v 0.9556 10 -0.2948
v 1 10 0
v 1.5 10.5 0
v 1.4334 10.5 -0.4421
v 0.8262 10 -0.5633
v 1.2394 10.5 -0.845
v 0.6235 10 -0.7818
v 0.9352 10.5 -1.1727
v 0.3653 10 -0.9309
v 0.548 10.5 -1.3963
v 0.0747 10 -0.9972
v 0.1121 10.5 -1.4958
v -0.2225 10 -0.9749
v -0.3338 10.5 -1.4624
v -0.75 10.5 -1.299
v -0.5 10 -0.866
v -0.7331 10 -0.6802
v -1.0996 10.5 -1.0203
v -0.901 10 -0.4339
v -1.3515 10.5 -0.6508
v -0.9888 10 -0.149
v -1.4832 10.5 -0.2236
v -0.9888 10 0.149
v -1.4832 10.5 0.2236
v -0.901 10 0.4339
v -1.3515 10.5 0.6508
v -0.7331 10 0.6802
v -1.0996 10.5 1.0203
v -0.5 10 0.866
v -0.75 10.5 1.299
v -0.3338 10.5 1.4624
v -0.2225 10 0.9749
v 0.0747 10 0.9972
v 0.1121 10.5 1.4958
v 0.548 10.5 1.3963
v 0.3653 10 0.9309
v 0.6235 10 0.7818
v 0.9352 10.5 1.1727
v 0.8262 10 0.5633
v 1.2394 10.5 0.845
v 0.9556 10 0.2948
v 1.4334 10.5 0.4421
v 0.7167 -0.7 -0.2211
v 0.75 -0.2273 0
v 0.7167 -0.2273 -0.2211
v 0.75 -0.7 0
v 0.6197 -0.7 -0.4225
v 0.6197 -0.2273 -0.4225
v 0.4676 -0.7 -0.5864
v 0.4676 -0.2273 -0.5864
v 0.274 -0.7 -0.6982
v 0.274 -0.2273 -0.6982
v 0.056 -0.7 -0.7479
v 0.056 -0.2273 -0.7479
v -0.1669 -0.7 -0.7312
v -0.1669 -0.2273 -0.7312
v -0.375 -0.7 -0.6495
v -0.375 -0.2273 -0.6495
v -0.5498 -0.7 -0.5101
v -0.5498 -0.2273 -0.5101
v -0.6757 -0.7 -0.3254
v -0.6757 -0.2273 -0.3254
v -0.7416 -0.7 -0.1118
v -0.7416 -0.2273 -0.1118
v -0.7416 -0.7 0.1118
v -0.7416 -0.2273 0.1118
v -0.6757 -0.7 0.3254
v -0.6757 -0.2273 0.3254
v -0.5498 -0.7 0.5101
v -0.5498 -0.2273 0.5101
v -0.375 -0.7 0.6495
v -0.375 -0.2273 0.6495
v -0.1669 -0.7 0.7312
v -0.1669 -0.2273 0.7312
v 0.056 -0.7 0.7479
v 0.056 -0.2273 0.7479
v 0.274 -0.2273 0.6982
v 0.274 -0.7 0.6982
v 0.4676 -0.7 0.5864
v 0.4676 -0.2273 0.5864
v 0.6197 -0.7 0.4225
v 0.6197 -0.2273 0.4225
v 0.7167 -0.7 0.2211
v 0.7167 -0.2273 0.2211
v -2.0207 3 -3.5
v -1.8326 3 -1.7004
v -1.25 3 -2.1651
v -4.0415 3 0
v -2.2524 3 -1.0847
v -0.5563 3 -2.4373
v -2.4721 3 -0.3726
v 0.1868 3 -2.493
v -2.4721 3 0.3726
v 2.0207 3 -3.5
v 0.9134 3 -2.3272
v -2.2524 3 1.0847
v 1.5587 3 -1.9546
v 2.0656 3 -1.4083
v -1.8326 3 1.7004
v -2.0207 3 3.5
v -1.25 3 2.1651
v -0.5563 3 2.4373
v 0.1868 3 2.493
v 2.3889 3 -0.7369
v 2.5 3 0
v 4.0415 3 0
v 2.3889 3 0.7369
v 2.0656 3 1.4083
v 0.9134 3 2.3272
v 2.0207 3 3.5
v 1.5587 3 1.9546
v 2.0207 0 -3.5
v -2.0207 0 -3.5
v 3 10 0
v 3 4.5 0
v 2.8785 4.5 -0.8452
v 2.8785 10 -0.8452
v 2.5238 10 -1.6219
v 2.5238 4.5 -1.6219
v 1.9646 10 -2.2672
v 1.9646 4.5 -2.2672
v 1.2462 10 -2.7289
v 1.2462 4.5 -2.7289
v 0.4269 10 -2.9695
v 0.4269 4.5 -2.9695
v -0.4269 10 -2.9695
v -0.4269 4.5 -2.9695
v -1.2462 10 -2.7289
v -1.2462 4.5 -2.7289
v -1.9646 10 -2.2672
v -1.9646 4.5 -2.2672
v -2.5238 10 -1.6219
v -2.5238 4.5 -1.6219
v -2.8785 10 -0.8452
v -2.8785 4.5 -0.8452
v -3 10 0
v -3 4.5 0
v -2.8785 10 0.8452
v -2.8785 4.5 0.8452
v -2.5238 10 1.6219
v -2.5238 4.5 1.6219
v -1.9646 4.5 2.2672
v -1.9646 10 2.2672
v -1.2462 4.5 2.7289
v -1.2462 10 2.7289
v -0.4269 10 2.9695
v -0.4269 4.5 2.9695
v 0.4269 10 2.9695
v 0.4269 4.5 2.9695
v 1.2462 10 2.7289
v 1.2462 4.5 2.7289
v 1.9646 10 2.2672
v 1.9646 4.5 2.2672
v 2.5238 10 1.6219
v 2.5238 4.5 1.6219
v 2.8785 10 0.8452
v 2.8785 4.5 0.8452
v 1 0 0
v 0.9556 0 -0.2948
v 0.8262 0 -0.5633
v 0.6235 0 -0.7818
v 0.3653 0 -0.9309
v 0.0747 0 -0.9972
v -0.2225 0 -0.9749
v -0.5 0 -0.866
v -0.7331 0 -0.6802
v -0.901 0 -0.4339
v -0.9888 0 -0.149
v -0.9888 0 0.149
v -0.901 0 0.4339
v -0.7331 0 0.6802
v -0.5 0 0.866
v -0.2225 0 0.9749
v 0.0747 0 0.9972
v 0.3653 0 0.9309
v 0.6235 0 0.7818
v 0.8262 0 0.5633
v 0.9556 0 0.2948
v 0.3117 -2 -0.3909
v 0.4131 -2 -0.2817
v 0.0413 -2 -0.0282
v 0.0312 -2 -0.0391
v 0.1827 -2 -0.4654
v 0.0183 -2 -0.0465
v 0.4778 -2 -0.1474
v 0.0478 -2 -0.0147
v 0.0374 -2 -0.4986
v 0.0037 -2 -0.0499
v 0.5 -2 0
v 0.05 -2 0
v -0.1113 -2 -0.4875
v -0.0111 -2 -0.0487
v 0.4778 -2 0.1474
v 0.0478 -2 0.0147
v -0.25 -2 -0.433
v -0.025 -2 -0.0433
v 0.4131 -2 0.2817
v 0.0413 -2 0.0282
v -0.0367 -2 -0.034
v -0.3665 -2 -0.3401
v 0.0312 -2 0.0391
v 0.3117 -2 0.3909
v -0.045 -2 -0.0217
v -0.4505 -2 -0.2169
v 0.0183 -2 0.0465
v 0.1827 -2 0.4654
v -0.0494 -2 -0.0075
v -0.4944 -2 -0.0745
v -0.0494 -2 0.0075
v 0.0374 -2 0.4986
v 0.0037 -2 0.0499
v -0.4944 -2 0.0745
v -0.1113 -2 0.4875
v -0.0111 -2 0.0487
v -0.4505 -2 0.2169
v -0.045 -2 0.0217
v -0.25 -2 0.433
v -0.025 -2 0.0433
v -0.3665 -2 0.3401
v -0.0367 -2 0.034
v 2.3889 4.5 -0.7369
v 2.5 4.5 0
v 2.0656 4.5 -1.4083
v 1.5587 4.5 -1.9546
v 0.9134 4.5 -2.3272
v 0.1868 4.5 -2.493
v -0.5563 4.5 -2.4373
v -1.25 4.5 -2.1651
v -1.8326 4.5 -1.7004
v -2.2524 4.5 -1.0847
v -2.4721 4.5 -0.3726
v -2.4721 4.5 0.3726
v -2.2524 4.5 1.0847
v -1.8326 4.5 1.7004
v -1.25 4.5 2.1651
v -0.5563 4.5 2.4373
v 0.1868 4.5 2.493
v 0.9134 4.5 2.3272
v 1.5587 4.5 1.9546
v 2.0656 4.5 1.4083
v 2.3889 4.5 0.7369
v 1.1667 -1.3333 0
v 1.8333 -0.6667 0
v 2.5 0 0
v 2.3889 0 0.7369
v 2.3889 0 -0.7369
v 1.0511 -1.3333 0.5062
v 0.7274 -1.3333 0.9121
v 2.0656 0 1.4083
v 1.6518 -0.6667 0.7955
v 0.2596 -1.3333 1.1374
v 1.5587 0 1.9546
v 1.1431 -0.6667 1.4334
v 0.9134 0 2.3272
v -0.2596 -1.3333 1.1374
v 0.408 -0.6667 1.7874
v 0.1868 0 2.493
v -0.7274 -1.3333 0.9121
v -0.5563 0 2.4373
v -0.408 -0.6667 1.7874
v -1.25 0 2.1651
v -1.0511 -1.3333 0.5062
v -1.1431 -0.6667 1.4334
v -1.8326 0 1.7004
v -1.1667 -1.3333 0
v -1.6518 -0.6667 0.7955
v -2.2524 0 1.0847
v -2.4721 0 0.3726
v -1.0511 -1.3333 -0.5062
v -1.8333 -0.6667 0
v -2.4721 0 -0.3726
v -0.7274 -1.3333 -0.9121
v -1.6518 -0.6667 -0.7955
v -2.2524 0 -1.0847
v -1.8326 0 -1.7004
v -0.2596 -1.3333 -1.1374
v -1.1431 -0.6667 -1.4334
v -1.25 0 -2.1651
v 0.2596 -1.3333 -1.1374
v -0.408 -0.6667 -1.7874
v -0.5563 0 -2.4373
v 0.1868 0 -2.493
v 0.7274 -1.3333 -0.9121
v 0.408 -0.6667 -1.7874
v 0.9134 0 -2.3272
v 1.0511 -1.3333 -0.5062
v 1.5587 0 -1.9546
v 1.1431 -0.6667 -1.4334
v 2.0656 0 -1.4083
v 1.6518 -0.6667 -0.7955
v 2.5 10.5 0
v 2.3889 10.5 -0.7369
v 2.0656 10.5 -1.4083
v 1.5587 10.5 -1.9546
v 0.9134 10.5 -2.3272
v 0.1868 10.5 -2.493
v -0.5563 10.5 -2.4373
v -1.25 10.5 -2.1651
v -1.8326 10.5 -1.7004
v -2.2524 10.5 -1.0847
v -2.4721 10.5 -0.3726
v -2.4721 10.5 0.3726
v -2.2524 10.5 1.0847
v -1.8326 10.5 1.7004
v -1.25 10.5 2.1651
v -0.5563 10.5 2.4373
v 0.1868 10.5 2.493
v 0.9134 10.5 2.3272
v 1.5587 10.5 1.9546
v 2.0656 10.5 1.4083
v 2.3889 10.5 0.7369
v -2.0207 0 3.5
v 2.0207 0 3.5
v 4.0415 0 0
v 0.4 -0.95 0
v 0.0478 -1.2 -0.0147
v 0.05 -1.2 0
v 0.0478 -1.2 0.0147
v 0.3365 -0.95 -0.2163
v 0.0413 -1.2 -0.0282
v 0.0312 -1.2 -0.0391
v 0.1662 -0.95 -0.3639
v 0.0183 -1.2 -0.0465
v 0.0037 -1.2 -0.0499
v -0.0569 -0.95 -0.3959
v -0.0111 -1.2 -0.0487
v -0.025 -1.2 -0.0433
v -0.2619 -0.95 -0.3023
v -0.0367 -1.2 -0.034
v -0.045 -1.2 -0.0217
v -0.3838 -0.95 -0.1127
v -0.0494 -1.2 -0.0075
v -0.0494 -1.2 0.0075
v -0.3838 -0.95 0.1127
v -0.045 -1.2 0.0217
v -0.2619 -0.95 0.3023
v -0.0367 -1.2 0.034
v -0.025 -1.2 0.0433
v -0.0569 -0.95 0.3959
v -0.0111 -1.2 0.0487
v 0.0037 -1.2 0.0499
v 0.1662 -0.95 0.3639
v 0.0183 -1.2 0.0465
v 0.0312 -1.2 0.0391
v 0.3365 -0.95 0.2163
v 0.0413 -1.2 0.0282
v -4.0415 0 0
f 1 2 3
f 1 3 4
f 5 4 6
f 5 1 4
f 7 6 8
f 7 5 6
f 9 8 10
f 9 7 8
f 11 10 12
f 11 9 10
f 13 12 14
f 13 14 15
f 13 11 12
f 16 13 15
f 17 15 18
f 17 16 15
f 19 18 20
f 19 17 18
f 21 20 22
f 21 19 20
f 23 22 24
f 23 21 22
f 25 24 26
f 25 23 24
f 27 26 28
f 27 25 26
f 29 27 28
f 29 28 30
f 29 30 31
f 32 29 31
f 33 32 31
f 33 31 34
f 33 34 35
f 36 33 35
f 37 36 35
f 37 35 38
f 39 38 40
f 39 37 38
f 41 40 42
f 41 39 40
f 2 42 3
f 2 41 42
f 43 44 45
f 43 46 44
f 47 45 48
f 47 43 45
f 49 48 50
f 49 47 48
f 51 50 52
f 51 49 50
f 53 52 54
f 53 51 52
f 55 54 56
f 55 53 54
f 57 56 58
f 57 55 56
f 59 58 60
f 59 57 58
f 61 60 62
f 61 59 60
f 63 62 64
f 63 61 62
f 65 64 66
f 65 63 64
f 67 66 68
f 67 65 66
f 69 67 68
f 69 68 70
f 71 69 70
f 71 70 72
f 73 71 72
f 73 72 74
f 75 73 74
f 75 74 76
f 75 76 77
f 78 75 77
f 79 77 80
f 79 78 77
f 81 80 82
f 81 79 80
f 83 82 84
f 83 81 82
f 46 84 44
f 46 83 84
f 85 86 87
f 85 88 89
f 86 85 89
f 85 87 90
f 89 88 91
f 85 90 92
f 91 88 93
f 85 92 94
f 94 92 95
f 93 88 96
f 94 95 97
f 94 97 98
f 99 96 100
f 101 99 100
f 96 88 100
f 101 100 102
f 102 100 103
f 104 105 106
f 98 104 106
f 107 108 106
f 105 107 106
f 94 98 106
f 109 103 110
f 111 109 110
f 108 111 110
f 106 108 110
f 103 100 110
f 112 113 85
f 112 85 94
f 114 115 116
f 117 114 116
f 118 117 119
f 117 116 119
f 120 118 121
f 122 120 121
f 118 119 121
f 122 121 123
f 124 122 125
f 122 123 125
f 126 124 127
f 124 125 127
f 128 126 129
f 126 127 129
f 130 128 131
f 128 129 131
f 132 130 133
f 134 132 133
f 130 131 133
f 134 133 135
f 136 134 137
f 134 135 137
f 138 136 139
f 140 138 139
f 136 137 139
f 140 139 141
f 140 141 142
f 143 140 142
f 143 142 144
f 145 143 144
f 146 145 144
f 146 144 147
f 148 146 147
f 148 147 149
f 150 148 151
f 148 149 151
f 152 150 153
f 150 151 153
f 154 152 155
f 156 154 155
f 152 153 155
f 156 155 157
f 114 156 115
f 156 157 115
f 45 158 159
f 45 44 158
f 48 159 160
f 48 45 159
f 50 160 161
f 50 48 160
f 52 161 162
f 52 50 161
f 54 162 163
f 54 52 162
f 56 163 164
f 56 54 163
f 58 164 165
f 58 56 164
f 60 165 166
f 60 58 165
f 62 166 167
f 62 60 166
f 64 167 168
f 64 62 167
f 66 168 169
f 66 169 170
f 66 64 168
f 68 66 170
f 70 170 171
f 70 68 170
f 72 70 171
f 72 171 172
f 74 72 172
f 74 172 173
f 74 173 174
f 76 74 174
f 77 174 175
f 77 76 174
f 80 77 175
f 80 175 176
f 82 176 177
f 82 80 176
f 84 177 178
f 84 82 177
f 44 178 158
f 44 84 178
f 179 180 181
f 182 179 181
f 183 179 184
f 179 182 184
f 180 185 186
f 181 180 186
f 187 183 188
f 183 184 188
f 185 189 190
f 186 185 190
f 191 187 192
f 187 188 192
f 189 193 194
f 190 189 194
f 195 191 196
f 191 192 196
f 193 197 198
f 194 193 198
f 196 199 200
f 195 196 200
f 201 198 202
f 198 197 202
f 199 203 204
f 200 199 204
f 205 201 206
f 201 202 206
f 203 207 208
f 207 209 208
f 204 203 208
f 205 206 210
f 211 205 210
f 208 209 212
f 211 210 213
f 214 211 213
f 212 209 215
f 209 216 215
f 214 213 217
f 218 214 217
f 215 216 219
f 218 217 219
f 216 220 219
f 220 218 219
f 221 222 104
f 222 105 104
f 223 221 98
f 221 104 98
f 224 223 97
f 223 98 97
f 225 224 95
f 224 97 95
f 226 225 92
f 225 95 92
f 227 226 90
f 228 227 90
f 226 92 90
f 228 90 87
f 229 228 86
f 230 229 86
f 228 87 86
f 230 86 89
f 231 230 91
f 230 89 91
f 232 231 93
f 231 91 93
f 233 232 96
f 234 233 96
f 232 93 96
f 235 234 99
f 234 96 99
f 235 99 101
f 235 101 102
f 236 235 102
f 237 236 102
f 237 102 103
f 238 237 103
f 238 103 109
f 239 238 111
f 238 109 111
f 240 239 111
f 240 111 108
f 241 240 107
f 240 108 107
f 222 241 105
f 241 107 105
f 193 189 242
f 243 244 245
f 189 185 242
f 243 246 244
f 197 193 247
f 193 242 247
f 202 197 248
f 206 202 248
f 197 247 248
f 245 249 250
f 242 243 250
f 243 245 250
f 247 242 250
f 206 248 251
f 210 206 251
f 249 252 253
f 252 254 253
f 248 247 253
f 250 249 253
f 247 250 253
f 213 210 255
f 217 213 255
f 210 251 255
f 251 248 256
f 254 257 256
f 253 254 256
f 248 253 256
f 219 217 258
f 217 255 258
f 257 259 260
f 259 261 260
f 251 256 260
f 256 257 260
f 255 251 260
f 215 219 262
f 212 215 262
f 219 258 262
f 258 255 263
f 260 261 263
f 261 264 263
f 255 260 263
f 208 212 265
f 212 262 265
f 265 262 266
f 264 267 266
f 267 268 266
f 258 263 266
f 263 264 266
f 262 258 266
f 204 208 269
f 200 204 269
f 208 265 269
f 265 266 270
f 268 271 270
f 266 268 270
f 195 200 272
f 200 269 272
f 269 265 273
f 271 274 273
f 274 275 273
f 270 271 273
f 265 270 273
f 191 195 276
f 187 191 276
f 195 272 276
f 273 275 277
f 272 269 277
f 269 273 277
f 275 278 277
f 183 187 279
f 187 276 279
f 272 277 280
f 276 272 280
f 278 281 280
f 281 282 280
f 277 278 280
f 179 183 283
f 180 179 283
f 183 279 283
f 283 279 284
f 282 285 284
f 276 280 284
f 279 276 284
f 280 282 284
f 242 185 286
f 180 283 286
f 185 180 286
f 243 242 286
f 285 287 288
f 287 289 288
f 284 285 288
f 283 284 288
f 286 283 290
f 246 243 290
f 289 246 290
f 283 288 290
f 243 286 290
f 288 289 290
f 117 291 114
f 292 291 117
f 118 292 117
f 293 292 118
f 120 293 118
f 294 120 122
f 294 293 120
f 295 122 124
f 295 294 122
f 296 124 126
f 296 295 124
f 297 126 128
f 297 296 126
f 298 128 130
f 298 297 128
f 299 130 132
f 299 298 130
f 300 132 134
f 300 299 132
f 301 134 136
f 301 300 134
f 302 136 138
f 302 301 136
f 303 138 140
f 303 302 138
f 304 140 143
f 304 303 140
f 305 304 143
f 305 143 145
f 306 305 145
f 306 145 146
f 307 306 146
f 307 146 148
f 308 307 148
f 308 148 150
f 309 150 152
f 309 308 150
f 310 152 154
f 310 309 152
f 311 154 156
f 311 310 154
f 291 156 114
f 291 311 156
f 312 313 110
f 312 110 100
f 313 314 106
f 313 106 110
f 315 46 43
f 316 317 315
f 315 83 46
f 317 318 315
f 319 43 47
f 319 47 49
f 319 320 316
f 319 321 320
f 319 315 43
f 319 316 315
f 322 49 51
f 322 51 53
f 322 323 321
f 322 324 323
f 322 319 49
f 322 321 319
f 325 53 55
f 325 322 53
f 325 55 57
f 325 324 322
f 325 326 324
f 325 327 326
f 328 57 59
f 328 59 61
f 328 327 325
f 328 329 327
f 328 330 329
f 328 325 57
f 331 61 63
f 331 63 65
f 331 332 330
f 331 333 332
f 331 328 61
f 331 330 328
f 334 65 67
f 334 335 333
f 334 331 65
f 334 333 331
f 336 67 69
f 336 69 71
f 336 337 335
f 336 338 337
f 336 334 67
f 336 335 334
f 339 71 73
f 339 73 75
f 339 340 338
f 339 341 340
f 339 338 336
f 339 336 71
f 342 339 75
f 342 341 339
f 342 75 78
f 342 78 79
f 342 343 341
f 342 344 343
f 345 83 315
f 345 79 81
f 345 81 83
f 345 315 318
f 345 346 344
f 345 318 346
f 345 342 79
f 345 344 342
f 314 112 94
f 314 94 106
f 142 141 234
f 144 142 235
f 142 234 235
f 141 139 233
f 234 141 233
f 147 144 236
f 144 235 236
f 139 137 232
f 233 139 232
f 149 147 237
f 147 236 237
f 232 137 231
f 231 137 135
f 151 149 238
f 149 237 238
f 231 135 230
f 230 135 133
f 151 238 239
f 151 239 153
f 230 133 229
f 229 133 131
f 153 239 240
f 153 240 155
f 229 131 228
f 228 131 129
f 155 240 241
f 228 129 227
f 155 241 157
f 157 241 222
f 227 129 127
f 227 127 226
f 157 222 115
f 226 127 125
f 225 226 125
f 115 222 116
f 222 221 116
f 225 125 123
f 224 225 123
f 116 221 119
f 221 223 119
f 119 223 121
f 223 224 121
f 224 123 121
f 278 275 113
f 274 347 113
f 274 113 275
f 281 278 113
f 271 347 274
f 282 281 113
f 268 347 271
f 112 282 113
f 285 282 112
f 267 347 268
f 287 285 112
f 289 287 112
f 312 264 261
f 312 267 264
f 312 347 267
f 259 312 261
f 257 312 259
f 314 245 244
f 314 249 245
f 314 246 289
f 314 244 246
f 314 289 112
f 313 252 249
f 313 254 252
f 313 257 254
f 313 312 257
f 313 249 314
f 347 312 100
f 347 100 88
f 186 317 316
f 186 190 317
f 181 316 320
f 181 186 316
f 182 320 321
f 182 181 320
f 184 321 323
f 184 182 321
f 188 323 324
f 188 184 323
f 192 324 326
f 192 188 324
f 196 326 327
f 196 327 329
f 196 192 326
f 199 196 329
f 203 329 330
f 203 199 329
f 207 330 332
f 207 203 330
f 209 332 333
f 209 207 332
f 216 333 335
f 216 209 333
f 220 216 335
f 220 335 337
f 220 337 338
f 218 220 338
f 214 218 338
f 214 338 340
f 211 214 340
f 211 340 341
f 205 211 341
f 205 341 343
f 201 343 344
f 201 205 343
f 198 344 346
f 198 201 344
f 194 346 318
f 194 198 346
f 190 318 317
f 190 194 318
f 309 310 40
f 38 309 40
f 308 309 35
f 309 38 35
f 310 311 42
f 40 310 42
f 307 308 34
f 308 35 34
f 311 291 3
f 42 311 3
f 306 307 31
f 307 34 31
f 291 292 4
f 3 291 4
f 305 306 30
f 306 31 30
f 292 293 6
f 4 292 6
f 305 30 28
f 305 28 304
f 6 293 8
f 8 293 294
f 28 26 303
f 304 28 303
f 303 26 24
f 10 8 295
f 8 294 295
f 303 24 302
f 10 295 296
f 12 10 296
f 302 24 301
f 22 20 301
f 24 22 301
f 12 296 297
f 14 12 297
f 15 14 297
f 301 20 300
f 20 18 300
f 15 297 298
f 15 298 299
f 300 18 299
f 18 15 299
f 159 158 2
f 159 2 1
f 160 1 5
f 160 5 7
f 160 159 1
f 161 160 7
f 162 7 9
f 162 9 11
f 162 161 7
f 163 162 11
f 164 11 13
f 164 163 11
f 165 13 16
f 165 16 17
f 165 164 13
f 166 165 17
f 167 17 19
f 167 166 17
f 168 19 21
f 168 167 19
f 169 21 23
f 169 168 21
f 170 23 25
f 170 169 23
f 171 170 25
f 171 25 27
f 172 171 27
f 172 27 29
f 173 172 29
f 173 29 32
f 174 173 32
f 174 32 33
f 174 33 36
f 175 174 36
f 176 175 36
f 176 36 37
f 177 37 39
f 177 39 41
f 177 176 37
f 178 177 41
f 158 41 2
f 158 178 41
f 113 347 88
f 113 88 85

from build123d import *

# Parameters (mm, degrees)
BOSS_EXTRUDE1_DEPTH = 3
CHAMFER1_SIZE       = 0.5


with BuildPart() as part:
    # Sketch1 → Boss-Extrude1 (new body)
    with BuildSketch(Plane.XZ):
        Polygon((-2.020725942, 3.5), (-4.041451884, 0), (-2.020725942, -3.5), (2.020725942, -3.5), (4.041451884, 0), (2.020725942, 3.5), align=None)
    extrude(amount=-BOSS_EXTRUDE1_DEPTH)

    # Sketch2 → Revolve1 (revolve)
    with BuildSketch(Plane(origin=(0, 0, 0), x_dir=(-1, 0, 0), z_dir=(0, 0, -1))):
        Polygon((-2.5, 3), (0, 3), (0, 10.5), (-3, 10.5), (-3, 4.5), (-2.5, 4.5), align=None)
    revolve(axis=Axis((0, 3, 0), (0, 1, 0)))

    # Sketch3 → Revolve2 (revolve)
    with BuildSketch(Plane.XY):
        Polygon((2.5, 0), (0, 0), (0, -2), (0.5, -2), align=None)
    revolve(axis=Axis((0, 0, 0), (0, -1, 0)))

    # Sketch4 → Cut-Revolve1 (revolve, cut)
    with BuildSketch(Plane(origin=(0, 0, 0), x_dir=(-1, 0, 0), z_dir=(0, 0, -1))):
        Polygon((-0.05, -2), (0, -2), (0, 10.5), (-1, 10.5), (-1, 0), (-0.75, -0.227272727), (-0.75, -0.7), (-0.05, -1.2), align=None)
    revolve(axis=Axis((0, -2, 0), (0, 1, 0)), mode=Mode.SUBTRACT)

    # Chamfer1
    chamfer1_edges = [part.edges().sort_by_distance(p)[0] for p in [
        (-3, 10.5, 0),
        (-1, 10.5, 0),
    ]]
    chamfer(chamfer1_edges, length=CHAMFER1_SIZE)


solid = part.part
